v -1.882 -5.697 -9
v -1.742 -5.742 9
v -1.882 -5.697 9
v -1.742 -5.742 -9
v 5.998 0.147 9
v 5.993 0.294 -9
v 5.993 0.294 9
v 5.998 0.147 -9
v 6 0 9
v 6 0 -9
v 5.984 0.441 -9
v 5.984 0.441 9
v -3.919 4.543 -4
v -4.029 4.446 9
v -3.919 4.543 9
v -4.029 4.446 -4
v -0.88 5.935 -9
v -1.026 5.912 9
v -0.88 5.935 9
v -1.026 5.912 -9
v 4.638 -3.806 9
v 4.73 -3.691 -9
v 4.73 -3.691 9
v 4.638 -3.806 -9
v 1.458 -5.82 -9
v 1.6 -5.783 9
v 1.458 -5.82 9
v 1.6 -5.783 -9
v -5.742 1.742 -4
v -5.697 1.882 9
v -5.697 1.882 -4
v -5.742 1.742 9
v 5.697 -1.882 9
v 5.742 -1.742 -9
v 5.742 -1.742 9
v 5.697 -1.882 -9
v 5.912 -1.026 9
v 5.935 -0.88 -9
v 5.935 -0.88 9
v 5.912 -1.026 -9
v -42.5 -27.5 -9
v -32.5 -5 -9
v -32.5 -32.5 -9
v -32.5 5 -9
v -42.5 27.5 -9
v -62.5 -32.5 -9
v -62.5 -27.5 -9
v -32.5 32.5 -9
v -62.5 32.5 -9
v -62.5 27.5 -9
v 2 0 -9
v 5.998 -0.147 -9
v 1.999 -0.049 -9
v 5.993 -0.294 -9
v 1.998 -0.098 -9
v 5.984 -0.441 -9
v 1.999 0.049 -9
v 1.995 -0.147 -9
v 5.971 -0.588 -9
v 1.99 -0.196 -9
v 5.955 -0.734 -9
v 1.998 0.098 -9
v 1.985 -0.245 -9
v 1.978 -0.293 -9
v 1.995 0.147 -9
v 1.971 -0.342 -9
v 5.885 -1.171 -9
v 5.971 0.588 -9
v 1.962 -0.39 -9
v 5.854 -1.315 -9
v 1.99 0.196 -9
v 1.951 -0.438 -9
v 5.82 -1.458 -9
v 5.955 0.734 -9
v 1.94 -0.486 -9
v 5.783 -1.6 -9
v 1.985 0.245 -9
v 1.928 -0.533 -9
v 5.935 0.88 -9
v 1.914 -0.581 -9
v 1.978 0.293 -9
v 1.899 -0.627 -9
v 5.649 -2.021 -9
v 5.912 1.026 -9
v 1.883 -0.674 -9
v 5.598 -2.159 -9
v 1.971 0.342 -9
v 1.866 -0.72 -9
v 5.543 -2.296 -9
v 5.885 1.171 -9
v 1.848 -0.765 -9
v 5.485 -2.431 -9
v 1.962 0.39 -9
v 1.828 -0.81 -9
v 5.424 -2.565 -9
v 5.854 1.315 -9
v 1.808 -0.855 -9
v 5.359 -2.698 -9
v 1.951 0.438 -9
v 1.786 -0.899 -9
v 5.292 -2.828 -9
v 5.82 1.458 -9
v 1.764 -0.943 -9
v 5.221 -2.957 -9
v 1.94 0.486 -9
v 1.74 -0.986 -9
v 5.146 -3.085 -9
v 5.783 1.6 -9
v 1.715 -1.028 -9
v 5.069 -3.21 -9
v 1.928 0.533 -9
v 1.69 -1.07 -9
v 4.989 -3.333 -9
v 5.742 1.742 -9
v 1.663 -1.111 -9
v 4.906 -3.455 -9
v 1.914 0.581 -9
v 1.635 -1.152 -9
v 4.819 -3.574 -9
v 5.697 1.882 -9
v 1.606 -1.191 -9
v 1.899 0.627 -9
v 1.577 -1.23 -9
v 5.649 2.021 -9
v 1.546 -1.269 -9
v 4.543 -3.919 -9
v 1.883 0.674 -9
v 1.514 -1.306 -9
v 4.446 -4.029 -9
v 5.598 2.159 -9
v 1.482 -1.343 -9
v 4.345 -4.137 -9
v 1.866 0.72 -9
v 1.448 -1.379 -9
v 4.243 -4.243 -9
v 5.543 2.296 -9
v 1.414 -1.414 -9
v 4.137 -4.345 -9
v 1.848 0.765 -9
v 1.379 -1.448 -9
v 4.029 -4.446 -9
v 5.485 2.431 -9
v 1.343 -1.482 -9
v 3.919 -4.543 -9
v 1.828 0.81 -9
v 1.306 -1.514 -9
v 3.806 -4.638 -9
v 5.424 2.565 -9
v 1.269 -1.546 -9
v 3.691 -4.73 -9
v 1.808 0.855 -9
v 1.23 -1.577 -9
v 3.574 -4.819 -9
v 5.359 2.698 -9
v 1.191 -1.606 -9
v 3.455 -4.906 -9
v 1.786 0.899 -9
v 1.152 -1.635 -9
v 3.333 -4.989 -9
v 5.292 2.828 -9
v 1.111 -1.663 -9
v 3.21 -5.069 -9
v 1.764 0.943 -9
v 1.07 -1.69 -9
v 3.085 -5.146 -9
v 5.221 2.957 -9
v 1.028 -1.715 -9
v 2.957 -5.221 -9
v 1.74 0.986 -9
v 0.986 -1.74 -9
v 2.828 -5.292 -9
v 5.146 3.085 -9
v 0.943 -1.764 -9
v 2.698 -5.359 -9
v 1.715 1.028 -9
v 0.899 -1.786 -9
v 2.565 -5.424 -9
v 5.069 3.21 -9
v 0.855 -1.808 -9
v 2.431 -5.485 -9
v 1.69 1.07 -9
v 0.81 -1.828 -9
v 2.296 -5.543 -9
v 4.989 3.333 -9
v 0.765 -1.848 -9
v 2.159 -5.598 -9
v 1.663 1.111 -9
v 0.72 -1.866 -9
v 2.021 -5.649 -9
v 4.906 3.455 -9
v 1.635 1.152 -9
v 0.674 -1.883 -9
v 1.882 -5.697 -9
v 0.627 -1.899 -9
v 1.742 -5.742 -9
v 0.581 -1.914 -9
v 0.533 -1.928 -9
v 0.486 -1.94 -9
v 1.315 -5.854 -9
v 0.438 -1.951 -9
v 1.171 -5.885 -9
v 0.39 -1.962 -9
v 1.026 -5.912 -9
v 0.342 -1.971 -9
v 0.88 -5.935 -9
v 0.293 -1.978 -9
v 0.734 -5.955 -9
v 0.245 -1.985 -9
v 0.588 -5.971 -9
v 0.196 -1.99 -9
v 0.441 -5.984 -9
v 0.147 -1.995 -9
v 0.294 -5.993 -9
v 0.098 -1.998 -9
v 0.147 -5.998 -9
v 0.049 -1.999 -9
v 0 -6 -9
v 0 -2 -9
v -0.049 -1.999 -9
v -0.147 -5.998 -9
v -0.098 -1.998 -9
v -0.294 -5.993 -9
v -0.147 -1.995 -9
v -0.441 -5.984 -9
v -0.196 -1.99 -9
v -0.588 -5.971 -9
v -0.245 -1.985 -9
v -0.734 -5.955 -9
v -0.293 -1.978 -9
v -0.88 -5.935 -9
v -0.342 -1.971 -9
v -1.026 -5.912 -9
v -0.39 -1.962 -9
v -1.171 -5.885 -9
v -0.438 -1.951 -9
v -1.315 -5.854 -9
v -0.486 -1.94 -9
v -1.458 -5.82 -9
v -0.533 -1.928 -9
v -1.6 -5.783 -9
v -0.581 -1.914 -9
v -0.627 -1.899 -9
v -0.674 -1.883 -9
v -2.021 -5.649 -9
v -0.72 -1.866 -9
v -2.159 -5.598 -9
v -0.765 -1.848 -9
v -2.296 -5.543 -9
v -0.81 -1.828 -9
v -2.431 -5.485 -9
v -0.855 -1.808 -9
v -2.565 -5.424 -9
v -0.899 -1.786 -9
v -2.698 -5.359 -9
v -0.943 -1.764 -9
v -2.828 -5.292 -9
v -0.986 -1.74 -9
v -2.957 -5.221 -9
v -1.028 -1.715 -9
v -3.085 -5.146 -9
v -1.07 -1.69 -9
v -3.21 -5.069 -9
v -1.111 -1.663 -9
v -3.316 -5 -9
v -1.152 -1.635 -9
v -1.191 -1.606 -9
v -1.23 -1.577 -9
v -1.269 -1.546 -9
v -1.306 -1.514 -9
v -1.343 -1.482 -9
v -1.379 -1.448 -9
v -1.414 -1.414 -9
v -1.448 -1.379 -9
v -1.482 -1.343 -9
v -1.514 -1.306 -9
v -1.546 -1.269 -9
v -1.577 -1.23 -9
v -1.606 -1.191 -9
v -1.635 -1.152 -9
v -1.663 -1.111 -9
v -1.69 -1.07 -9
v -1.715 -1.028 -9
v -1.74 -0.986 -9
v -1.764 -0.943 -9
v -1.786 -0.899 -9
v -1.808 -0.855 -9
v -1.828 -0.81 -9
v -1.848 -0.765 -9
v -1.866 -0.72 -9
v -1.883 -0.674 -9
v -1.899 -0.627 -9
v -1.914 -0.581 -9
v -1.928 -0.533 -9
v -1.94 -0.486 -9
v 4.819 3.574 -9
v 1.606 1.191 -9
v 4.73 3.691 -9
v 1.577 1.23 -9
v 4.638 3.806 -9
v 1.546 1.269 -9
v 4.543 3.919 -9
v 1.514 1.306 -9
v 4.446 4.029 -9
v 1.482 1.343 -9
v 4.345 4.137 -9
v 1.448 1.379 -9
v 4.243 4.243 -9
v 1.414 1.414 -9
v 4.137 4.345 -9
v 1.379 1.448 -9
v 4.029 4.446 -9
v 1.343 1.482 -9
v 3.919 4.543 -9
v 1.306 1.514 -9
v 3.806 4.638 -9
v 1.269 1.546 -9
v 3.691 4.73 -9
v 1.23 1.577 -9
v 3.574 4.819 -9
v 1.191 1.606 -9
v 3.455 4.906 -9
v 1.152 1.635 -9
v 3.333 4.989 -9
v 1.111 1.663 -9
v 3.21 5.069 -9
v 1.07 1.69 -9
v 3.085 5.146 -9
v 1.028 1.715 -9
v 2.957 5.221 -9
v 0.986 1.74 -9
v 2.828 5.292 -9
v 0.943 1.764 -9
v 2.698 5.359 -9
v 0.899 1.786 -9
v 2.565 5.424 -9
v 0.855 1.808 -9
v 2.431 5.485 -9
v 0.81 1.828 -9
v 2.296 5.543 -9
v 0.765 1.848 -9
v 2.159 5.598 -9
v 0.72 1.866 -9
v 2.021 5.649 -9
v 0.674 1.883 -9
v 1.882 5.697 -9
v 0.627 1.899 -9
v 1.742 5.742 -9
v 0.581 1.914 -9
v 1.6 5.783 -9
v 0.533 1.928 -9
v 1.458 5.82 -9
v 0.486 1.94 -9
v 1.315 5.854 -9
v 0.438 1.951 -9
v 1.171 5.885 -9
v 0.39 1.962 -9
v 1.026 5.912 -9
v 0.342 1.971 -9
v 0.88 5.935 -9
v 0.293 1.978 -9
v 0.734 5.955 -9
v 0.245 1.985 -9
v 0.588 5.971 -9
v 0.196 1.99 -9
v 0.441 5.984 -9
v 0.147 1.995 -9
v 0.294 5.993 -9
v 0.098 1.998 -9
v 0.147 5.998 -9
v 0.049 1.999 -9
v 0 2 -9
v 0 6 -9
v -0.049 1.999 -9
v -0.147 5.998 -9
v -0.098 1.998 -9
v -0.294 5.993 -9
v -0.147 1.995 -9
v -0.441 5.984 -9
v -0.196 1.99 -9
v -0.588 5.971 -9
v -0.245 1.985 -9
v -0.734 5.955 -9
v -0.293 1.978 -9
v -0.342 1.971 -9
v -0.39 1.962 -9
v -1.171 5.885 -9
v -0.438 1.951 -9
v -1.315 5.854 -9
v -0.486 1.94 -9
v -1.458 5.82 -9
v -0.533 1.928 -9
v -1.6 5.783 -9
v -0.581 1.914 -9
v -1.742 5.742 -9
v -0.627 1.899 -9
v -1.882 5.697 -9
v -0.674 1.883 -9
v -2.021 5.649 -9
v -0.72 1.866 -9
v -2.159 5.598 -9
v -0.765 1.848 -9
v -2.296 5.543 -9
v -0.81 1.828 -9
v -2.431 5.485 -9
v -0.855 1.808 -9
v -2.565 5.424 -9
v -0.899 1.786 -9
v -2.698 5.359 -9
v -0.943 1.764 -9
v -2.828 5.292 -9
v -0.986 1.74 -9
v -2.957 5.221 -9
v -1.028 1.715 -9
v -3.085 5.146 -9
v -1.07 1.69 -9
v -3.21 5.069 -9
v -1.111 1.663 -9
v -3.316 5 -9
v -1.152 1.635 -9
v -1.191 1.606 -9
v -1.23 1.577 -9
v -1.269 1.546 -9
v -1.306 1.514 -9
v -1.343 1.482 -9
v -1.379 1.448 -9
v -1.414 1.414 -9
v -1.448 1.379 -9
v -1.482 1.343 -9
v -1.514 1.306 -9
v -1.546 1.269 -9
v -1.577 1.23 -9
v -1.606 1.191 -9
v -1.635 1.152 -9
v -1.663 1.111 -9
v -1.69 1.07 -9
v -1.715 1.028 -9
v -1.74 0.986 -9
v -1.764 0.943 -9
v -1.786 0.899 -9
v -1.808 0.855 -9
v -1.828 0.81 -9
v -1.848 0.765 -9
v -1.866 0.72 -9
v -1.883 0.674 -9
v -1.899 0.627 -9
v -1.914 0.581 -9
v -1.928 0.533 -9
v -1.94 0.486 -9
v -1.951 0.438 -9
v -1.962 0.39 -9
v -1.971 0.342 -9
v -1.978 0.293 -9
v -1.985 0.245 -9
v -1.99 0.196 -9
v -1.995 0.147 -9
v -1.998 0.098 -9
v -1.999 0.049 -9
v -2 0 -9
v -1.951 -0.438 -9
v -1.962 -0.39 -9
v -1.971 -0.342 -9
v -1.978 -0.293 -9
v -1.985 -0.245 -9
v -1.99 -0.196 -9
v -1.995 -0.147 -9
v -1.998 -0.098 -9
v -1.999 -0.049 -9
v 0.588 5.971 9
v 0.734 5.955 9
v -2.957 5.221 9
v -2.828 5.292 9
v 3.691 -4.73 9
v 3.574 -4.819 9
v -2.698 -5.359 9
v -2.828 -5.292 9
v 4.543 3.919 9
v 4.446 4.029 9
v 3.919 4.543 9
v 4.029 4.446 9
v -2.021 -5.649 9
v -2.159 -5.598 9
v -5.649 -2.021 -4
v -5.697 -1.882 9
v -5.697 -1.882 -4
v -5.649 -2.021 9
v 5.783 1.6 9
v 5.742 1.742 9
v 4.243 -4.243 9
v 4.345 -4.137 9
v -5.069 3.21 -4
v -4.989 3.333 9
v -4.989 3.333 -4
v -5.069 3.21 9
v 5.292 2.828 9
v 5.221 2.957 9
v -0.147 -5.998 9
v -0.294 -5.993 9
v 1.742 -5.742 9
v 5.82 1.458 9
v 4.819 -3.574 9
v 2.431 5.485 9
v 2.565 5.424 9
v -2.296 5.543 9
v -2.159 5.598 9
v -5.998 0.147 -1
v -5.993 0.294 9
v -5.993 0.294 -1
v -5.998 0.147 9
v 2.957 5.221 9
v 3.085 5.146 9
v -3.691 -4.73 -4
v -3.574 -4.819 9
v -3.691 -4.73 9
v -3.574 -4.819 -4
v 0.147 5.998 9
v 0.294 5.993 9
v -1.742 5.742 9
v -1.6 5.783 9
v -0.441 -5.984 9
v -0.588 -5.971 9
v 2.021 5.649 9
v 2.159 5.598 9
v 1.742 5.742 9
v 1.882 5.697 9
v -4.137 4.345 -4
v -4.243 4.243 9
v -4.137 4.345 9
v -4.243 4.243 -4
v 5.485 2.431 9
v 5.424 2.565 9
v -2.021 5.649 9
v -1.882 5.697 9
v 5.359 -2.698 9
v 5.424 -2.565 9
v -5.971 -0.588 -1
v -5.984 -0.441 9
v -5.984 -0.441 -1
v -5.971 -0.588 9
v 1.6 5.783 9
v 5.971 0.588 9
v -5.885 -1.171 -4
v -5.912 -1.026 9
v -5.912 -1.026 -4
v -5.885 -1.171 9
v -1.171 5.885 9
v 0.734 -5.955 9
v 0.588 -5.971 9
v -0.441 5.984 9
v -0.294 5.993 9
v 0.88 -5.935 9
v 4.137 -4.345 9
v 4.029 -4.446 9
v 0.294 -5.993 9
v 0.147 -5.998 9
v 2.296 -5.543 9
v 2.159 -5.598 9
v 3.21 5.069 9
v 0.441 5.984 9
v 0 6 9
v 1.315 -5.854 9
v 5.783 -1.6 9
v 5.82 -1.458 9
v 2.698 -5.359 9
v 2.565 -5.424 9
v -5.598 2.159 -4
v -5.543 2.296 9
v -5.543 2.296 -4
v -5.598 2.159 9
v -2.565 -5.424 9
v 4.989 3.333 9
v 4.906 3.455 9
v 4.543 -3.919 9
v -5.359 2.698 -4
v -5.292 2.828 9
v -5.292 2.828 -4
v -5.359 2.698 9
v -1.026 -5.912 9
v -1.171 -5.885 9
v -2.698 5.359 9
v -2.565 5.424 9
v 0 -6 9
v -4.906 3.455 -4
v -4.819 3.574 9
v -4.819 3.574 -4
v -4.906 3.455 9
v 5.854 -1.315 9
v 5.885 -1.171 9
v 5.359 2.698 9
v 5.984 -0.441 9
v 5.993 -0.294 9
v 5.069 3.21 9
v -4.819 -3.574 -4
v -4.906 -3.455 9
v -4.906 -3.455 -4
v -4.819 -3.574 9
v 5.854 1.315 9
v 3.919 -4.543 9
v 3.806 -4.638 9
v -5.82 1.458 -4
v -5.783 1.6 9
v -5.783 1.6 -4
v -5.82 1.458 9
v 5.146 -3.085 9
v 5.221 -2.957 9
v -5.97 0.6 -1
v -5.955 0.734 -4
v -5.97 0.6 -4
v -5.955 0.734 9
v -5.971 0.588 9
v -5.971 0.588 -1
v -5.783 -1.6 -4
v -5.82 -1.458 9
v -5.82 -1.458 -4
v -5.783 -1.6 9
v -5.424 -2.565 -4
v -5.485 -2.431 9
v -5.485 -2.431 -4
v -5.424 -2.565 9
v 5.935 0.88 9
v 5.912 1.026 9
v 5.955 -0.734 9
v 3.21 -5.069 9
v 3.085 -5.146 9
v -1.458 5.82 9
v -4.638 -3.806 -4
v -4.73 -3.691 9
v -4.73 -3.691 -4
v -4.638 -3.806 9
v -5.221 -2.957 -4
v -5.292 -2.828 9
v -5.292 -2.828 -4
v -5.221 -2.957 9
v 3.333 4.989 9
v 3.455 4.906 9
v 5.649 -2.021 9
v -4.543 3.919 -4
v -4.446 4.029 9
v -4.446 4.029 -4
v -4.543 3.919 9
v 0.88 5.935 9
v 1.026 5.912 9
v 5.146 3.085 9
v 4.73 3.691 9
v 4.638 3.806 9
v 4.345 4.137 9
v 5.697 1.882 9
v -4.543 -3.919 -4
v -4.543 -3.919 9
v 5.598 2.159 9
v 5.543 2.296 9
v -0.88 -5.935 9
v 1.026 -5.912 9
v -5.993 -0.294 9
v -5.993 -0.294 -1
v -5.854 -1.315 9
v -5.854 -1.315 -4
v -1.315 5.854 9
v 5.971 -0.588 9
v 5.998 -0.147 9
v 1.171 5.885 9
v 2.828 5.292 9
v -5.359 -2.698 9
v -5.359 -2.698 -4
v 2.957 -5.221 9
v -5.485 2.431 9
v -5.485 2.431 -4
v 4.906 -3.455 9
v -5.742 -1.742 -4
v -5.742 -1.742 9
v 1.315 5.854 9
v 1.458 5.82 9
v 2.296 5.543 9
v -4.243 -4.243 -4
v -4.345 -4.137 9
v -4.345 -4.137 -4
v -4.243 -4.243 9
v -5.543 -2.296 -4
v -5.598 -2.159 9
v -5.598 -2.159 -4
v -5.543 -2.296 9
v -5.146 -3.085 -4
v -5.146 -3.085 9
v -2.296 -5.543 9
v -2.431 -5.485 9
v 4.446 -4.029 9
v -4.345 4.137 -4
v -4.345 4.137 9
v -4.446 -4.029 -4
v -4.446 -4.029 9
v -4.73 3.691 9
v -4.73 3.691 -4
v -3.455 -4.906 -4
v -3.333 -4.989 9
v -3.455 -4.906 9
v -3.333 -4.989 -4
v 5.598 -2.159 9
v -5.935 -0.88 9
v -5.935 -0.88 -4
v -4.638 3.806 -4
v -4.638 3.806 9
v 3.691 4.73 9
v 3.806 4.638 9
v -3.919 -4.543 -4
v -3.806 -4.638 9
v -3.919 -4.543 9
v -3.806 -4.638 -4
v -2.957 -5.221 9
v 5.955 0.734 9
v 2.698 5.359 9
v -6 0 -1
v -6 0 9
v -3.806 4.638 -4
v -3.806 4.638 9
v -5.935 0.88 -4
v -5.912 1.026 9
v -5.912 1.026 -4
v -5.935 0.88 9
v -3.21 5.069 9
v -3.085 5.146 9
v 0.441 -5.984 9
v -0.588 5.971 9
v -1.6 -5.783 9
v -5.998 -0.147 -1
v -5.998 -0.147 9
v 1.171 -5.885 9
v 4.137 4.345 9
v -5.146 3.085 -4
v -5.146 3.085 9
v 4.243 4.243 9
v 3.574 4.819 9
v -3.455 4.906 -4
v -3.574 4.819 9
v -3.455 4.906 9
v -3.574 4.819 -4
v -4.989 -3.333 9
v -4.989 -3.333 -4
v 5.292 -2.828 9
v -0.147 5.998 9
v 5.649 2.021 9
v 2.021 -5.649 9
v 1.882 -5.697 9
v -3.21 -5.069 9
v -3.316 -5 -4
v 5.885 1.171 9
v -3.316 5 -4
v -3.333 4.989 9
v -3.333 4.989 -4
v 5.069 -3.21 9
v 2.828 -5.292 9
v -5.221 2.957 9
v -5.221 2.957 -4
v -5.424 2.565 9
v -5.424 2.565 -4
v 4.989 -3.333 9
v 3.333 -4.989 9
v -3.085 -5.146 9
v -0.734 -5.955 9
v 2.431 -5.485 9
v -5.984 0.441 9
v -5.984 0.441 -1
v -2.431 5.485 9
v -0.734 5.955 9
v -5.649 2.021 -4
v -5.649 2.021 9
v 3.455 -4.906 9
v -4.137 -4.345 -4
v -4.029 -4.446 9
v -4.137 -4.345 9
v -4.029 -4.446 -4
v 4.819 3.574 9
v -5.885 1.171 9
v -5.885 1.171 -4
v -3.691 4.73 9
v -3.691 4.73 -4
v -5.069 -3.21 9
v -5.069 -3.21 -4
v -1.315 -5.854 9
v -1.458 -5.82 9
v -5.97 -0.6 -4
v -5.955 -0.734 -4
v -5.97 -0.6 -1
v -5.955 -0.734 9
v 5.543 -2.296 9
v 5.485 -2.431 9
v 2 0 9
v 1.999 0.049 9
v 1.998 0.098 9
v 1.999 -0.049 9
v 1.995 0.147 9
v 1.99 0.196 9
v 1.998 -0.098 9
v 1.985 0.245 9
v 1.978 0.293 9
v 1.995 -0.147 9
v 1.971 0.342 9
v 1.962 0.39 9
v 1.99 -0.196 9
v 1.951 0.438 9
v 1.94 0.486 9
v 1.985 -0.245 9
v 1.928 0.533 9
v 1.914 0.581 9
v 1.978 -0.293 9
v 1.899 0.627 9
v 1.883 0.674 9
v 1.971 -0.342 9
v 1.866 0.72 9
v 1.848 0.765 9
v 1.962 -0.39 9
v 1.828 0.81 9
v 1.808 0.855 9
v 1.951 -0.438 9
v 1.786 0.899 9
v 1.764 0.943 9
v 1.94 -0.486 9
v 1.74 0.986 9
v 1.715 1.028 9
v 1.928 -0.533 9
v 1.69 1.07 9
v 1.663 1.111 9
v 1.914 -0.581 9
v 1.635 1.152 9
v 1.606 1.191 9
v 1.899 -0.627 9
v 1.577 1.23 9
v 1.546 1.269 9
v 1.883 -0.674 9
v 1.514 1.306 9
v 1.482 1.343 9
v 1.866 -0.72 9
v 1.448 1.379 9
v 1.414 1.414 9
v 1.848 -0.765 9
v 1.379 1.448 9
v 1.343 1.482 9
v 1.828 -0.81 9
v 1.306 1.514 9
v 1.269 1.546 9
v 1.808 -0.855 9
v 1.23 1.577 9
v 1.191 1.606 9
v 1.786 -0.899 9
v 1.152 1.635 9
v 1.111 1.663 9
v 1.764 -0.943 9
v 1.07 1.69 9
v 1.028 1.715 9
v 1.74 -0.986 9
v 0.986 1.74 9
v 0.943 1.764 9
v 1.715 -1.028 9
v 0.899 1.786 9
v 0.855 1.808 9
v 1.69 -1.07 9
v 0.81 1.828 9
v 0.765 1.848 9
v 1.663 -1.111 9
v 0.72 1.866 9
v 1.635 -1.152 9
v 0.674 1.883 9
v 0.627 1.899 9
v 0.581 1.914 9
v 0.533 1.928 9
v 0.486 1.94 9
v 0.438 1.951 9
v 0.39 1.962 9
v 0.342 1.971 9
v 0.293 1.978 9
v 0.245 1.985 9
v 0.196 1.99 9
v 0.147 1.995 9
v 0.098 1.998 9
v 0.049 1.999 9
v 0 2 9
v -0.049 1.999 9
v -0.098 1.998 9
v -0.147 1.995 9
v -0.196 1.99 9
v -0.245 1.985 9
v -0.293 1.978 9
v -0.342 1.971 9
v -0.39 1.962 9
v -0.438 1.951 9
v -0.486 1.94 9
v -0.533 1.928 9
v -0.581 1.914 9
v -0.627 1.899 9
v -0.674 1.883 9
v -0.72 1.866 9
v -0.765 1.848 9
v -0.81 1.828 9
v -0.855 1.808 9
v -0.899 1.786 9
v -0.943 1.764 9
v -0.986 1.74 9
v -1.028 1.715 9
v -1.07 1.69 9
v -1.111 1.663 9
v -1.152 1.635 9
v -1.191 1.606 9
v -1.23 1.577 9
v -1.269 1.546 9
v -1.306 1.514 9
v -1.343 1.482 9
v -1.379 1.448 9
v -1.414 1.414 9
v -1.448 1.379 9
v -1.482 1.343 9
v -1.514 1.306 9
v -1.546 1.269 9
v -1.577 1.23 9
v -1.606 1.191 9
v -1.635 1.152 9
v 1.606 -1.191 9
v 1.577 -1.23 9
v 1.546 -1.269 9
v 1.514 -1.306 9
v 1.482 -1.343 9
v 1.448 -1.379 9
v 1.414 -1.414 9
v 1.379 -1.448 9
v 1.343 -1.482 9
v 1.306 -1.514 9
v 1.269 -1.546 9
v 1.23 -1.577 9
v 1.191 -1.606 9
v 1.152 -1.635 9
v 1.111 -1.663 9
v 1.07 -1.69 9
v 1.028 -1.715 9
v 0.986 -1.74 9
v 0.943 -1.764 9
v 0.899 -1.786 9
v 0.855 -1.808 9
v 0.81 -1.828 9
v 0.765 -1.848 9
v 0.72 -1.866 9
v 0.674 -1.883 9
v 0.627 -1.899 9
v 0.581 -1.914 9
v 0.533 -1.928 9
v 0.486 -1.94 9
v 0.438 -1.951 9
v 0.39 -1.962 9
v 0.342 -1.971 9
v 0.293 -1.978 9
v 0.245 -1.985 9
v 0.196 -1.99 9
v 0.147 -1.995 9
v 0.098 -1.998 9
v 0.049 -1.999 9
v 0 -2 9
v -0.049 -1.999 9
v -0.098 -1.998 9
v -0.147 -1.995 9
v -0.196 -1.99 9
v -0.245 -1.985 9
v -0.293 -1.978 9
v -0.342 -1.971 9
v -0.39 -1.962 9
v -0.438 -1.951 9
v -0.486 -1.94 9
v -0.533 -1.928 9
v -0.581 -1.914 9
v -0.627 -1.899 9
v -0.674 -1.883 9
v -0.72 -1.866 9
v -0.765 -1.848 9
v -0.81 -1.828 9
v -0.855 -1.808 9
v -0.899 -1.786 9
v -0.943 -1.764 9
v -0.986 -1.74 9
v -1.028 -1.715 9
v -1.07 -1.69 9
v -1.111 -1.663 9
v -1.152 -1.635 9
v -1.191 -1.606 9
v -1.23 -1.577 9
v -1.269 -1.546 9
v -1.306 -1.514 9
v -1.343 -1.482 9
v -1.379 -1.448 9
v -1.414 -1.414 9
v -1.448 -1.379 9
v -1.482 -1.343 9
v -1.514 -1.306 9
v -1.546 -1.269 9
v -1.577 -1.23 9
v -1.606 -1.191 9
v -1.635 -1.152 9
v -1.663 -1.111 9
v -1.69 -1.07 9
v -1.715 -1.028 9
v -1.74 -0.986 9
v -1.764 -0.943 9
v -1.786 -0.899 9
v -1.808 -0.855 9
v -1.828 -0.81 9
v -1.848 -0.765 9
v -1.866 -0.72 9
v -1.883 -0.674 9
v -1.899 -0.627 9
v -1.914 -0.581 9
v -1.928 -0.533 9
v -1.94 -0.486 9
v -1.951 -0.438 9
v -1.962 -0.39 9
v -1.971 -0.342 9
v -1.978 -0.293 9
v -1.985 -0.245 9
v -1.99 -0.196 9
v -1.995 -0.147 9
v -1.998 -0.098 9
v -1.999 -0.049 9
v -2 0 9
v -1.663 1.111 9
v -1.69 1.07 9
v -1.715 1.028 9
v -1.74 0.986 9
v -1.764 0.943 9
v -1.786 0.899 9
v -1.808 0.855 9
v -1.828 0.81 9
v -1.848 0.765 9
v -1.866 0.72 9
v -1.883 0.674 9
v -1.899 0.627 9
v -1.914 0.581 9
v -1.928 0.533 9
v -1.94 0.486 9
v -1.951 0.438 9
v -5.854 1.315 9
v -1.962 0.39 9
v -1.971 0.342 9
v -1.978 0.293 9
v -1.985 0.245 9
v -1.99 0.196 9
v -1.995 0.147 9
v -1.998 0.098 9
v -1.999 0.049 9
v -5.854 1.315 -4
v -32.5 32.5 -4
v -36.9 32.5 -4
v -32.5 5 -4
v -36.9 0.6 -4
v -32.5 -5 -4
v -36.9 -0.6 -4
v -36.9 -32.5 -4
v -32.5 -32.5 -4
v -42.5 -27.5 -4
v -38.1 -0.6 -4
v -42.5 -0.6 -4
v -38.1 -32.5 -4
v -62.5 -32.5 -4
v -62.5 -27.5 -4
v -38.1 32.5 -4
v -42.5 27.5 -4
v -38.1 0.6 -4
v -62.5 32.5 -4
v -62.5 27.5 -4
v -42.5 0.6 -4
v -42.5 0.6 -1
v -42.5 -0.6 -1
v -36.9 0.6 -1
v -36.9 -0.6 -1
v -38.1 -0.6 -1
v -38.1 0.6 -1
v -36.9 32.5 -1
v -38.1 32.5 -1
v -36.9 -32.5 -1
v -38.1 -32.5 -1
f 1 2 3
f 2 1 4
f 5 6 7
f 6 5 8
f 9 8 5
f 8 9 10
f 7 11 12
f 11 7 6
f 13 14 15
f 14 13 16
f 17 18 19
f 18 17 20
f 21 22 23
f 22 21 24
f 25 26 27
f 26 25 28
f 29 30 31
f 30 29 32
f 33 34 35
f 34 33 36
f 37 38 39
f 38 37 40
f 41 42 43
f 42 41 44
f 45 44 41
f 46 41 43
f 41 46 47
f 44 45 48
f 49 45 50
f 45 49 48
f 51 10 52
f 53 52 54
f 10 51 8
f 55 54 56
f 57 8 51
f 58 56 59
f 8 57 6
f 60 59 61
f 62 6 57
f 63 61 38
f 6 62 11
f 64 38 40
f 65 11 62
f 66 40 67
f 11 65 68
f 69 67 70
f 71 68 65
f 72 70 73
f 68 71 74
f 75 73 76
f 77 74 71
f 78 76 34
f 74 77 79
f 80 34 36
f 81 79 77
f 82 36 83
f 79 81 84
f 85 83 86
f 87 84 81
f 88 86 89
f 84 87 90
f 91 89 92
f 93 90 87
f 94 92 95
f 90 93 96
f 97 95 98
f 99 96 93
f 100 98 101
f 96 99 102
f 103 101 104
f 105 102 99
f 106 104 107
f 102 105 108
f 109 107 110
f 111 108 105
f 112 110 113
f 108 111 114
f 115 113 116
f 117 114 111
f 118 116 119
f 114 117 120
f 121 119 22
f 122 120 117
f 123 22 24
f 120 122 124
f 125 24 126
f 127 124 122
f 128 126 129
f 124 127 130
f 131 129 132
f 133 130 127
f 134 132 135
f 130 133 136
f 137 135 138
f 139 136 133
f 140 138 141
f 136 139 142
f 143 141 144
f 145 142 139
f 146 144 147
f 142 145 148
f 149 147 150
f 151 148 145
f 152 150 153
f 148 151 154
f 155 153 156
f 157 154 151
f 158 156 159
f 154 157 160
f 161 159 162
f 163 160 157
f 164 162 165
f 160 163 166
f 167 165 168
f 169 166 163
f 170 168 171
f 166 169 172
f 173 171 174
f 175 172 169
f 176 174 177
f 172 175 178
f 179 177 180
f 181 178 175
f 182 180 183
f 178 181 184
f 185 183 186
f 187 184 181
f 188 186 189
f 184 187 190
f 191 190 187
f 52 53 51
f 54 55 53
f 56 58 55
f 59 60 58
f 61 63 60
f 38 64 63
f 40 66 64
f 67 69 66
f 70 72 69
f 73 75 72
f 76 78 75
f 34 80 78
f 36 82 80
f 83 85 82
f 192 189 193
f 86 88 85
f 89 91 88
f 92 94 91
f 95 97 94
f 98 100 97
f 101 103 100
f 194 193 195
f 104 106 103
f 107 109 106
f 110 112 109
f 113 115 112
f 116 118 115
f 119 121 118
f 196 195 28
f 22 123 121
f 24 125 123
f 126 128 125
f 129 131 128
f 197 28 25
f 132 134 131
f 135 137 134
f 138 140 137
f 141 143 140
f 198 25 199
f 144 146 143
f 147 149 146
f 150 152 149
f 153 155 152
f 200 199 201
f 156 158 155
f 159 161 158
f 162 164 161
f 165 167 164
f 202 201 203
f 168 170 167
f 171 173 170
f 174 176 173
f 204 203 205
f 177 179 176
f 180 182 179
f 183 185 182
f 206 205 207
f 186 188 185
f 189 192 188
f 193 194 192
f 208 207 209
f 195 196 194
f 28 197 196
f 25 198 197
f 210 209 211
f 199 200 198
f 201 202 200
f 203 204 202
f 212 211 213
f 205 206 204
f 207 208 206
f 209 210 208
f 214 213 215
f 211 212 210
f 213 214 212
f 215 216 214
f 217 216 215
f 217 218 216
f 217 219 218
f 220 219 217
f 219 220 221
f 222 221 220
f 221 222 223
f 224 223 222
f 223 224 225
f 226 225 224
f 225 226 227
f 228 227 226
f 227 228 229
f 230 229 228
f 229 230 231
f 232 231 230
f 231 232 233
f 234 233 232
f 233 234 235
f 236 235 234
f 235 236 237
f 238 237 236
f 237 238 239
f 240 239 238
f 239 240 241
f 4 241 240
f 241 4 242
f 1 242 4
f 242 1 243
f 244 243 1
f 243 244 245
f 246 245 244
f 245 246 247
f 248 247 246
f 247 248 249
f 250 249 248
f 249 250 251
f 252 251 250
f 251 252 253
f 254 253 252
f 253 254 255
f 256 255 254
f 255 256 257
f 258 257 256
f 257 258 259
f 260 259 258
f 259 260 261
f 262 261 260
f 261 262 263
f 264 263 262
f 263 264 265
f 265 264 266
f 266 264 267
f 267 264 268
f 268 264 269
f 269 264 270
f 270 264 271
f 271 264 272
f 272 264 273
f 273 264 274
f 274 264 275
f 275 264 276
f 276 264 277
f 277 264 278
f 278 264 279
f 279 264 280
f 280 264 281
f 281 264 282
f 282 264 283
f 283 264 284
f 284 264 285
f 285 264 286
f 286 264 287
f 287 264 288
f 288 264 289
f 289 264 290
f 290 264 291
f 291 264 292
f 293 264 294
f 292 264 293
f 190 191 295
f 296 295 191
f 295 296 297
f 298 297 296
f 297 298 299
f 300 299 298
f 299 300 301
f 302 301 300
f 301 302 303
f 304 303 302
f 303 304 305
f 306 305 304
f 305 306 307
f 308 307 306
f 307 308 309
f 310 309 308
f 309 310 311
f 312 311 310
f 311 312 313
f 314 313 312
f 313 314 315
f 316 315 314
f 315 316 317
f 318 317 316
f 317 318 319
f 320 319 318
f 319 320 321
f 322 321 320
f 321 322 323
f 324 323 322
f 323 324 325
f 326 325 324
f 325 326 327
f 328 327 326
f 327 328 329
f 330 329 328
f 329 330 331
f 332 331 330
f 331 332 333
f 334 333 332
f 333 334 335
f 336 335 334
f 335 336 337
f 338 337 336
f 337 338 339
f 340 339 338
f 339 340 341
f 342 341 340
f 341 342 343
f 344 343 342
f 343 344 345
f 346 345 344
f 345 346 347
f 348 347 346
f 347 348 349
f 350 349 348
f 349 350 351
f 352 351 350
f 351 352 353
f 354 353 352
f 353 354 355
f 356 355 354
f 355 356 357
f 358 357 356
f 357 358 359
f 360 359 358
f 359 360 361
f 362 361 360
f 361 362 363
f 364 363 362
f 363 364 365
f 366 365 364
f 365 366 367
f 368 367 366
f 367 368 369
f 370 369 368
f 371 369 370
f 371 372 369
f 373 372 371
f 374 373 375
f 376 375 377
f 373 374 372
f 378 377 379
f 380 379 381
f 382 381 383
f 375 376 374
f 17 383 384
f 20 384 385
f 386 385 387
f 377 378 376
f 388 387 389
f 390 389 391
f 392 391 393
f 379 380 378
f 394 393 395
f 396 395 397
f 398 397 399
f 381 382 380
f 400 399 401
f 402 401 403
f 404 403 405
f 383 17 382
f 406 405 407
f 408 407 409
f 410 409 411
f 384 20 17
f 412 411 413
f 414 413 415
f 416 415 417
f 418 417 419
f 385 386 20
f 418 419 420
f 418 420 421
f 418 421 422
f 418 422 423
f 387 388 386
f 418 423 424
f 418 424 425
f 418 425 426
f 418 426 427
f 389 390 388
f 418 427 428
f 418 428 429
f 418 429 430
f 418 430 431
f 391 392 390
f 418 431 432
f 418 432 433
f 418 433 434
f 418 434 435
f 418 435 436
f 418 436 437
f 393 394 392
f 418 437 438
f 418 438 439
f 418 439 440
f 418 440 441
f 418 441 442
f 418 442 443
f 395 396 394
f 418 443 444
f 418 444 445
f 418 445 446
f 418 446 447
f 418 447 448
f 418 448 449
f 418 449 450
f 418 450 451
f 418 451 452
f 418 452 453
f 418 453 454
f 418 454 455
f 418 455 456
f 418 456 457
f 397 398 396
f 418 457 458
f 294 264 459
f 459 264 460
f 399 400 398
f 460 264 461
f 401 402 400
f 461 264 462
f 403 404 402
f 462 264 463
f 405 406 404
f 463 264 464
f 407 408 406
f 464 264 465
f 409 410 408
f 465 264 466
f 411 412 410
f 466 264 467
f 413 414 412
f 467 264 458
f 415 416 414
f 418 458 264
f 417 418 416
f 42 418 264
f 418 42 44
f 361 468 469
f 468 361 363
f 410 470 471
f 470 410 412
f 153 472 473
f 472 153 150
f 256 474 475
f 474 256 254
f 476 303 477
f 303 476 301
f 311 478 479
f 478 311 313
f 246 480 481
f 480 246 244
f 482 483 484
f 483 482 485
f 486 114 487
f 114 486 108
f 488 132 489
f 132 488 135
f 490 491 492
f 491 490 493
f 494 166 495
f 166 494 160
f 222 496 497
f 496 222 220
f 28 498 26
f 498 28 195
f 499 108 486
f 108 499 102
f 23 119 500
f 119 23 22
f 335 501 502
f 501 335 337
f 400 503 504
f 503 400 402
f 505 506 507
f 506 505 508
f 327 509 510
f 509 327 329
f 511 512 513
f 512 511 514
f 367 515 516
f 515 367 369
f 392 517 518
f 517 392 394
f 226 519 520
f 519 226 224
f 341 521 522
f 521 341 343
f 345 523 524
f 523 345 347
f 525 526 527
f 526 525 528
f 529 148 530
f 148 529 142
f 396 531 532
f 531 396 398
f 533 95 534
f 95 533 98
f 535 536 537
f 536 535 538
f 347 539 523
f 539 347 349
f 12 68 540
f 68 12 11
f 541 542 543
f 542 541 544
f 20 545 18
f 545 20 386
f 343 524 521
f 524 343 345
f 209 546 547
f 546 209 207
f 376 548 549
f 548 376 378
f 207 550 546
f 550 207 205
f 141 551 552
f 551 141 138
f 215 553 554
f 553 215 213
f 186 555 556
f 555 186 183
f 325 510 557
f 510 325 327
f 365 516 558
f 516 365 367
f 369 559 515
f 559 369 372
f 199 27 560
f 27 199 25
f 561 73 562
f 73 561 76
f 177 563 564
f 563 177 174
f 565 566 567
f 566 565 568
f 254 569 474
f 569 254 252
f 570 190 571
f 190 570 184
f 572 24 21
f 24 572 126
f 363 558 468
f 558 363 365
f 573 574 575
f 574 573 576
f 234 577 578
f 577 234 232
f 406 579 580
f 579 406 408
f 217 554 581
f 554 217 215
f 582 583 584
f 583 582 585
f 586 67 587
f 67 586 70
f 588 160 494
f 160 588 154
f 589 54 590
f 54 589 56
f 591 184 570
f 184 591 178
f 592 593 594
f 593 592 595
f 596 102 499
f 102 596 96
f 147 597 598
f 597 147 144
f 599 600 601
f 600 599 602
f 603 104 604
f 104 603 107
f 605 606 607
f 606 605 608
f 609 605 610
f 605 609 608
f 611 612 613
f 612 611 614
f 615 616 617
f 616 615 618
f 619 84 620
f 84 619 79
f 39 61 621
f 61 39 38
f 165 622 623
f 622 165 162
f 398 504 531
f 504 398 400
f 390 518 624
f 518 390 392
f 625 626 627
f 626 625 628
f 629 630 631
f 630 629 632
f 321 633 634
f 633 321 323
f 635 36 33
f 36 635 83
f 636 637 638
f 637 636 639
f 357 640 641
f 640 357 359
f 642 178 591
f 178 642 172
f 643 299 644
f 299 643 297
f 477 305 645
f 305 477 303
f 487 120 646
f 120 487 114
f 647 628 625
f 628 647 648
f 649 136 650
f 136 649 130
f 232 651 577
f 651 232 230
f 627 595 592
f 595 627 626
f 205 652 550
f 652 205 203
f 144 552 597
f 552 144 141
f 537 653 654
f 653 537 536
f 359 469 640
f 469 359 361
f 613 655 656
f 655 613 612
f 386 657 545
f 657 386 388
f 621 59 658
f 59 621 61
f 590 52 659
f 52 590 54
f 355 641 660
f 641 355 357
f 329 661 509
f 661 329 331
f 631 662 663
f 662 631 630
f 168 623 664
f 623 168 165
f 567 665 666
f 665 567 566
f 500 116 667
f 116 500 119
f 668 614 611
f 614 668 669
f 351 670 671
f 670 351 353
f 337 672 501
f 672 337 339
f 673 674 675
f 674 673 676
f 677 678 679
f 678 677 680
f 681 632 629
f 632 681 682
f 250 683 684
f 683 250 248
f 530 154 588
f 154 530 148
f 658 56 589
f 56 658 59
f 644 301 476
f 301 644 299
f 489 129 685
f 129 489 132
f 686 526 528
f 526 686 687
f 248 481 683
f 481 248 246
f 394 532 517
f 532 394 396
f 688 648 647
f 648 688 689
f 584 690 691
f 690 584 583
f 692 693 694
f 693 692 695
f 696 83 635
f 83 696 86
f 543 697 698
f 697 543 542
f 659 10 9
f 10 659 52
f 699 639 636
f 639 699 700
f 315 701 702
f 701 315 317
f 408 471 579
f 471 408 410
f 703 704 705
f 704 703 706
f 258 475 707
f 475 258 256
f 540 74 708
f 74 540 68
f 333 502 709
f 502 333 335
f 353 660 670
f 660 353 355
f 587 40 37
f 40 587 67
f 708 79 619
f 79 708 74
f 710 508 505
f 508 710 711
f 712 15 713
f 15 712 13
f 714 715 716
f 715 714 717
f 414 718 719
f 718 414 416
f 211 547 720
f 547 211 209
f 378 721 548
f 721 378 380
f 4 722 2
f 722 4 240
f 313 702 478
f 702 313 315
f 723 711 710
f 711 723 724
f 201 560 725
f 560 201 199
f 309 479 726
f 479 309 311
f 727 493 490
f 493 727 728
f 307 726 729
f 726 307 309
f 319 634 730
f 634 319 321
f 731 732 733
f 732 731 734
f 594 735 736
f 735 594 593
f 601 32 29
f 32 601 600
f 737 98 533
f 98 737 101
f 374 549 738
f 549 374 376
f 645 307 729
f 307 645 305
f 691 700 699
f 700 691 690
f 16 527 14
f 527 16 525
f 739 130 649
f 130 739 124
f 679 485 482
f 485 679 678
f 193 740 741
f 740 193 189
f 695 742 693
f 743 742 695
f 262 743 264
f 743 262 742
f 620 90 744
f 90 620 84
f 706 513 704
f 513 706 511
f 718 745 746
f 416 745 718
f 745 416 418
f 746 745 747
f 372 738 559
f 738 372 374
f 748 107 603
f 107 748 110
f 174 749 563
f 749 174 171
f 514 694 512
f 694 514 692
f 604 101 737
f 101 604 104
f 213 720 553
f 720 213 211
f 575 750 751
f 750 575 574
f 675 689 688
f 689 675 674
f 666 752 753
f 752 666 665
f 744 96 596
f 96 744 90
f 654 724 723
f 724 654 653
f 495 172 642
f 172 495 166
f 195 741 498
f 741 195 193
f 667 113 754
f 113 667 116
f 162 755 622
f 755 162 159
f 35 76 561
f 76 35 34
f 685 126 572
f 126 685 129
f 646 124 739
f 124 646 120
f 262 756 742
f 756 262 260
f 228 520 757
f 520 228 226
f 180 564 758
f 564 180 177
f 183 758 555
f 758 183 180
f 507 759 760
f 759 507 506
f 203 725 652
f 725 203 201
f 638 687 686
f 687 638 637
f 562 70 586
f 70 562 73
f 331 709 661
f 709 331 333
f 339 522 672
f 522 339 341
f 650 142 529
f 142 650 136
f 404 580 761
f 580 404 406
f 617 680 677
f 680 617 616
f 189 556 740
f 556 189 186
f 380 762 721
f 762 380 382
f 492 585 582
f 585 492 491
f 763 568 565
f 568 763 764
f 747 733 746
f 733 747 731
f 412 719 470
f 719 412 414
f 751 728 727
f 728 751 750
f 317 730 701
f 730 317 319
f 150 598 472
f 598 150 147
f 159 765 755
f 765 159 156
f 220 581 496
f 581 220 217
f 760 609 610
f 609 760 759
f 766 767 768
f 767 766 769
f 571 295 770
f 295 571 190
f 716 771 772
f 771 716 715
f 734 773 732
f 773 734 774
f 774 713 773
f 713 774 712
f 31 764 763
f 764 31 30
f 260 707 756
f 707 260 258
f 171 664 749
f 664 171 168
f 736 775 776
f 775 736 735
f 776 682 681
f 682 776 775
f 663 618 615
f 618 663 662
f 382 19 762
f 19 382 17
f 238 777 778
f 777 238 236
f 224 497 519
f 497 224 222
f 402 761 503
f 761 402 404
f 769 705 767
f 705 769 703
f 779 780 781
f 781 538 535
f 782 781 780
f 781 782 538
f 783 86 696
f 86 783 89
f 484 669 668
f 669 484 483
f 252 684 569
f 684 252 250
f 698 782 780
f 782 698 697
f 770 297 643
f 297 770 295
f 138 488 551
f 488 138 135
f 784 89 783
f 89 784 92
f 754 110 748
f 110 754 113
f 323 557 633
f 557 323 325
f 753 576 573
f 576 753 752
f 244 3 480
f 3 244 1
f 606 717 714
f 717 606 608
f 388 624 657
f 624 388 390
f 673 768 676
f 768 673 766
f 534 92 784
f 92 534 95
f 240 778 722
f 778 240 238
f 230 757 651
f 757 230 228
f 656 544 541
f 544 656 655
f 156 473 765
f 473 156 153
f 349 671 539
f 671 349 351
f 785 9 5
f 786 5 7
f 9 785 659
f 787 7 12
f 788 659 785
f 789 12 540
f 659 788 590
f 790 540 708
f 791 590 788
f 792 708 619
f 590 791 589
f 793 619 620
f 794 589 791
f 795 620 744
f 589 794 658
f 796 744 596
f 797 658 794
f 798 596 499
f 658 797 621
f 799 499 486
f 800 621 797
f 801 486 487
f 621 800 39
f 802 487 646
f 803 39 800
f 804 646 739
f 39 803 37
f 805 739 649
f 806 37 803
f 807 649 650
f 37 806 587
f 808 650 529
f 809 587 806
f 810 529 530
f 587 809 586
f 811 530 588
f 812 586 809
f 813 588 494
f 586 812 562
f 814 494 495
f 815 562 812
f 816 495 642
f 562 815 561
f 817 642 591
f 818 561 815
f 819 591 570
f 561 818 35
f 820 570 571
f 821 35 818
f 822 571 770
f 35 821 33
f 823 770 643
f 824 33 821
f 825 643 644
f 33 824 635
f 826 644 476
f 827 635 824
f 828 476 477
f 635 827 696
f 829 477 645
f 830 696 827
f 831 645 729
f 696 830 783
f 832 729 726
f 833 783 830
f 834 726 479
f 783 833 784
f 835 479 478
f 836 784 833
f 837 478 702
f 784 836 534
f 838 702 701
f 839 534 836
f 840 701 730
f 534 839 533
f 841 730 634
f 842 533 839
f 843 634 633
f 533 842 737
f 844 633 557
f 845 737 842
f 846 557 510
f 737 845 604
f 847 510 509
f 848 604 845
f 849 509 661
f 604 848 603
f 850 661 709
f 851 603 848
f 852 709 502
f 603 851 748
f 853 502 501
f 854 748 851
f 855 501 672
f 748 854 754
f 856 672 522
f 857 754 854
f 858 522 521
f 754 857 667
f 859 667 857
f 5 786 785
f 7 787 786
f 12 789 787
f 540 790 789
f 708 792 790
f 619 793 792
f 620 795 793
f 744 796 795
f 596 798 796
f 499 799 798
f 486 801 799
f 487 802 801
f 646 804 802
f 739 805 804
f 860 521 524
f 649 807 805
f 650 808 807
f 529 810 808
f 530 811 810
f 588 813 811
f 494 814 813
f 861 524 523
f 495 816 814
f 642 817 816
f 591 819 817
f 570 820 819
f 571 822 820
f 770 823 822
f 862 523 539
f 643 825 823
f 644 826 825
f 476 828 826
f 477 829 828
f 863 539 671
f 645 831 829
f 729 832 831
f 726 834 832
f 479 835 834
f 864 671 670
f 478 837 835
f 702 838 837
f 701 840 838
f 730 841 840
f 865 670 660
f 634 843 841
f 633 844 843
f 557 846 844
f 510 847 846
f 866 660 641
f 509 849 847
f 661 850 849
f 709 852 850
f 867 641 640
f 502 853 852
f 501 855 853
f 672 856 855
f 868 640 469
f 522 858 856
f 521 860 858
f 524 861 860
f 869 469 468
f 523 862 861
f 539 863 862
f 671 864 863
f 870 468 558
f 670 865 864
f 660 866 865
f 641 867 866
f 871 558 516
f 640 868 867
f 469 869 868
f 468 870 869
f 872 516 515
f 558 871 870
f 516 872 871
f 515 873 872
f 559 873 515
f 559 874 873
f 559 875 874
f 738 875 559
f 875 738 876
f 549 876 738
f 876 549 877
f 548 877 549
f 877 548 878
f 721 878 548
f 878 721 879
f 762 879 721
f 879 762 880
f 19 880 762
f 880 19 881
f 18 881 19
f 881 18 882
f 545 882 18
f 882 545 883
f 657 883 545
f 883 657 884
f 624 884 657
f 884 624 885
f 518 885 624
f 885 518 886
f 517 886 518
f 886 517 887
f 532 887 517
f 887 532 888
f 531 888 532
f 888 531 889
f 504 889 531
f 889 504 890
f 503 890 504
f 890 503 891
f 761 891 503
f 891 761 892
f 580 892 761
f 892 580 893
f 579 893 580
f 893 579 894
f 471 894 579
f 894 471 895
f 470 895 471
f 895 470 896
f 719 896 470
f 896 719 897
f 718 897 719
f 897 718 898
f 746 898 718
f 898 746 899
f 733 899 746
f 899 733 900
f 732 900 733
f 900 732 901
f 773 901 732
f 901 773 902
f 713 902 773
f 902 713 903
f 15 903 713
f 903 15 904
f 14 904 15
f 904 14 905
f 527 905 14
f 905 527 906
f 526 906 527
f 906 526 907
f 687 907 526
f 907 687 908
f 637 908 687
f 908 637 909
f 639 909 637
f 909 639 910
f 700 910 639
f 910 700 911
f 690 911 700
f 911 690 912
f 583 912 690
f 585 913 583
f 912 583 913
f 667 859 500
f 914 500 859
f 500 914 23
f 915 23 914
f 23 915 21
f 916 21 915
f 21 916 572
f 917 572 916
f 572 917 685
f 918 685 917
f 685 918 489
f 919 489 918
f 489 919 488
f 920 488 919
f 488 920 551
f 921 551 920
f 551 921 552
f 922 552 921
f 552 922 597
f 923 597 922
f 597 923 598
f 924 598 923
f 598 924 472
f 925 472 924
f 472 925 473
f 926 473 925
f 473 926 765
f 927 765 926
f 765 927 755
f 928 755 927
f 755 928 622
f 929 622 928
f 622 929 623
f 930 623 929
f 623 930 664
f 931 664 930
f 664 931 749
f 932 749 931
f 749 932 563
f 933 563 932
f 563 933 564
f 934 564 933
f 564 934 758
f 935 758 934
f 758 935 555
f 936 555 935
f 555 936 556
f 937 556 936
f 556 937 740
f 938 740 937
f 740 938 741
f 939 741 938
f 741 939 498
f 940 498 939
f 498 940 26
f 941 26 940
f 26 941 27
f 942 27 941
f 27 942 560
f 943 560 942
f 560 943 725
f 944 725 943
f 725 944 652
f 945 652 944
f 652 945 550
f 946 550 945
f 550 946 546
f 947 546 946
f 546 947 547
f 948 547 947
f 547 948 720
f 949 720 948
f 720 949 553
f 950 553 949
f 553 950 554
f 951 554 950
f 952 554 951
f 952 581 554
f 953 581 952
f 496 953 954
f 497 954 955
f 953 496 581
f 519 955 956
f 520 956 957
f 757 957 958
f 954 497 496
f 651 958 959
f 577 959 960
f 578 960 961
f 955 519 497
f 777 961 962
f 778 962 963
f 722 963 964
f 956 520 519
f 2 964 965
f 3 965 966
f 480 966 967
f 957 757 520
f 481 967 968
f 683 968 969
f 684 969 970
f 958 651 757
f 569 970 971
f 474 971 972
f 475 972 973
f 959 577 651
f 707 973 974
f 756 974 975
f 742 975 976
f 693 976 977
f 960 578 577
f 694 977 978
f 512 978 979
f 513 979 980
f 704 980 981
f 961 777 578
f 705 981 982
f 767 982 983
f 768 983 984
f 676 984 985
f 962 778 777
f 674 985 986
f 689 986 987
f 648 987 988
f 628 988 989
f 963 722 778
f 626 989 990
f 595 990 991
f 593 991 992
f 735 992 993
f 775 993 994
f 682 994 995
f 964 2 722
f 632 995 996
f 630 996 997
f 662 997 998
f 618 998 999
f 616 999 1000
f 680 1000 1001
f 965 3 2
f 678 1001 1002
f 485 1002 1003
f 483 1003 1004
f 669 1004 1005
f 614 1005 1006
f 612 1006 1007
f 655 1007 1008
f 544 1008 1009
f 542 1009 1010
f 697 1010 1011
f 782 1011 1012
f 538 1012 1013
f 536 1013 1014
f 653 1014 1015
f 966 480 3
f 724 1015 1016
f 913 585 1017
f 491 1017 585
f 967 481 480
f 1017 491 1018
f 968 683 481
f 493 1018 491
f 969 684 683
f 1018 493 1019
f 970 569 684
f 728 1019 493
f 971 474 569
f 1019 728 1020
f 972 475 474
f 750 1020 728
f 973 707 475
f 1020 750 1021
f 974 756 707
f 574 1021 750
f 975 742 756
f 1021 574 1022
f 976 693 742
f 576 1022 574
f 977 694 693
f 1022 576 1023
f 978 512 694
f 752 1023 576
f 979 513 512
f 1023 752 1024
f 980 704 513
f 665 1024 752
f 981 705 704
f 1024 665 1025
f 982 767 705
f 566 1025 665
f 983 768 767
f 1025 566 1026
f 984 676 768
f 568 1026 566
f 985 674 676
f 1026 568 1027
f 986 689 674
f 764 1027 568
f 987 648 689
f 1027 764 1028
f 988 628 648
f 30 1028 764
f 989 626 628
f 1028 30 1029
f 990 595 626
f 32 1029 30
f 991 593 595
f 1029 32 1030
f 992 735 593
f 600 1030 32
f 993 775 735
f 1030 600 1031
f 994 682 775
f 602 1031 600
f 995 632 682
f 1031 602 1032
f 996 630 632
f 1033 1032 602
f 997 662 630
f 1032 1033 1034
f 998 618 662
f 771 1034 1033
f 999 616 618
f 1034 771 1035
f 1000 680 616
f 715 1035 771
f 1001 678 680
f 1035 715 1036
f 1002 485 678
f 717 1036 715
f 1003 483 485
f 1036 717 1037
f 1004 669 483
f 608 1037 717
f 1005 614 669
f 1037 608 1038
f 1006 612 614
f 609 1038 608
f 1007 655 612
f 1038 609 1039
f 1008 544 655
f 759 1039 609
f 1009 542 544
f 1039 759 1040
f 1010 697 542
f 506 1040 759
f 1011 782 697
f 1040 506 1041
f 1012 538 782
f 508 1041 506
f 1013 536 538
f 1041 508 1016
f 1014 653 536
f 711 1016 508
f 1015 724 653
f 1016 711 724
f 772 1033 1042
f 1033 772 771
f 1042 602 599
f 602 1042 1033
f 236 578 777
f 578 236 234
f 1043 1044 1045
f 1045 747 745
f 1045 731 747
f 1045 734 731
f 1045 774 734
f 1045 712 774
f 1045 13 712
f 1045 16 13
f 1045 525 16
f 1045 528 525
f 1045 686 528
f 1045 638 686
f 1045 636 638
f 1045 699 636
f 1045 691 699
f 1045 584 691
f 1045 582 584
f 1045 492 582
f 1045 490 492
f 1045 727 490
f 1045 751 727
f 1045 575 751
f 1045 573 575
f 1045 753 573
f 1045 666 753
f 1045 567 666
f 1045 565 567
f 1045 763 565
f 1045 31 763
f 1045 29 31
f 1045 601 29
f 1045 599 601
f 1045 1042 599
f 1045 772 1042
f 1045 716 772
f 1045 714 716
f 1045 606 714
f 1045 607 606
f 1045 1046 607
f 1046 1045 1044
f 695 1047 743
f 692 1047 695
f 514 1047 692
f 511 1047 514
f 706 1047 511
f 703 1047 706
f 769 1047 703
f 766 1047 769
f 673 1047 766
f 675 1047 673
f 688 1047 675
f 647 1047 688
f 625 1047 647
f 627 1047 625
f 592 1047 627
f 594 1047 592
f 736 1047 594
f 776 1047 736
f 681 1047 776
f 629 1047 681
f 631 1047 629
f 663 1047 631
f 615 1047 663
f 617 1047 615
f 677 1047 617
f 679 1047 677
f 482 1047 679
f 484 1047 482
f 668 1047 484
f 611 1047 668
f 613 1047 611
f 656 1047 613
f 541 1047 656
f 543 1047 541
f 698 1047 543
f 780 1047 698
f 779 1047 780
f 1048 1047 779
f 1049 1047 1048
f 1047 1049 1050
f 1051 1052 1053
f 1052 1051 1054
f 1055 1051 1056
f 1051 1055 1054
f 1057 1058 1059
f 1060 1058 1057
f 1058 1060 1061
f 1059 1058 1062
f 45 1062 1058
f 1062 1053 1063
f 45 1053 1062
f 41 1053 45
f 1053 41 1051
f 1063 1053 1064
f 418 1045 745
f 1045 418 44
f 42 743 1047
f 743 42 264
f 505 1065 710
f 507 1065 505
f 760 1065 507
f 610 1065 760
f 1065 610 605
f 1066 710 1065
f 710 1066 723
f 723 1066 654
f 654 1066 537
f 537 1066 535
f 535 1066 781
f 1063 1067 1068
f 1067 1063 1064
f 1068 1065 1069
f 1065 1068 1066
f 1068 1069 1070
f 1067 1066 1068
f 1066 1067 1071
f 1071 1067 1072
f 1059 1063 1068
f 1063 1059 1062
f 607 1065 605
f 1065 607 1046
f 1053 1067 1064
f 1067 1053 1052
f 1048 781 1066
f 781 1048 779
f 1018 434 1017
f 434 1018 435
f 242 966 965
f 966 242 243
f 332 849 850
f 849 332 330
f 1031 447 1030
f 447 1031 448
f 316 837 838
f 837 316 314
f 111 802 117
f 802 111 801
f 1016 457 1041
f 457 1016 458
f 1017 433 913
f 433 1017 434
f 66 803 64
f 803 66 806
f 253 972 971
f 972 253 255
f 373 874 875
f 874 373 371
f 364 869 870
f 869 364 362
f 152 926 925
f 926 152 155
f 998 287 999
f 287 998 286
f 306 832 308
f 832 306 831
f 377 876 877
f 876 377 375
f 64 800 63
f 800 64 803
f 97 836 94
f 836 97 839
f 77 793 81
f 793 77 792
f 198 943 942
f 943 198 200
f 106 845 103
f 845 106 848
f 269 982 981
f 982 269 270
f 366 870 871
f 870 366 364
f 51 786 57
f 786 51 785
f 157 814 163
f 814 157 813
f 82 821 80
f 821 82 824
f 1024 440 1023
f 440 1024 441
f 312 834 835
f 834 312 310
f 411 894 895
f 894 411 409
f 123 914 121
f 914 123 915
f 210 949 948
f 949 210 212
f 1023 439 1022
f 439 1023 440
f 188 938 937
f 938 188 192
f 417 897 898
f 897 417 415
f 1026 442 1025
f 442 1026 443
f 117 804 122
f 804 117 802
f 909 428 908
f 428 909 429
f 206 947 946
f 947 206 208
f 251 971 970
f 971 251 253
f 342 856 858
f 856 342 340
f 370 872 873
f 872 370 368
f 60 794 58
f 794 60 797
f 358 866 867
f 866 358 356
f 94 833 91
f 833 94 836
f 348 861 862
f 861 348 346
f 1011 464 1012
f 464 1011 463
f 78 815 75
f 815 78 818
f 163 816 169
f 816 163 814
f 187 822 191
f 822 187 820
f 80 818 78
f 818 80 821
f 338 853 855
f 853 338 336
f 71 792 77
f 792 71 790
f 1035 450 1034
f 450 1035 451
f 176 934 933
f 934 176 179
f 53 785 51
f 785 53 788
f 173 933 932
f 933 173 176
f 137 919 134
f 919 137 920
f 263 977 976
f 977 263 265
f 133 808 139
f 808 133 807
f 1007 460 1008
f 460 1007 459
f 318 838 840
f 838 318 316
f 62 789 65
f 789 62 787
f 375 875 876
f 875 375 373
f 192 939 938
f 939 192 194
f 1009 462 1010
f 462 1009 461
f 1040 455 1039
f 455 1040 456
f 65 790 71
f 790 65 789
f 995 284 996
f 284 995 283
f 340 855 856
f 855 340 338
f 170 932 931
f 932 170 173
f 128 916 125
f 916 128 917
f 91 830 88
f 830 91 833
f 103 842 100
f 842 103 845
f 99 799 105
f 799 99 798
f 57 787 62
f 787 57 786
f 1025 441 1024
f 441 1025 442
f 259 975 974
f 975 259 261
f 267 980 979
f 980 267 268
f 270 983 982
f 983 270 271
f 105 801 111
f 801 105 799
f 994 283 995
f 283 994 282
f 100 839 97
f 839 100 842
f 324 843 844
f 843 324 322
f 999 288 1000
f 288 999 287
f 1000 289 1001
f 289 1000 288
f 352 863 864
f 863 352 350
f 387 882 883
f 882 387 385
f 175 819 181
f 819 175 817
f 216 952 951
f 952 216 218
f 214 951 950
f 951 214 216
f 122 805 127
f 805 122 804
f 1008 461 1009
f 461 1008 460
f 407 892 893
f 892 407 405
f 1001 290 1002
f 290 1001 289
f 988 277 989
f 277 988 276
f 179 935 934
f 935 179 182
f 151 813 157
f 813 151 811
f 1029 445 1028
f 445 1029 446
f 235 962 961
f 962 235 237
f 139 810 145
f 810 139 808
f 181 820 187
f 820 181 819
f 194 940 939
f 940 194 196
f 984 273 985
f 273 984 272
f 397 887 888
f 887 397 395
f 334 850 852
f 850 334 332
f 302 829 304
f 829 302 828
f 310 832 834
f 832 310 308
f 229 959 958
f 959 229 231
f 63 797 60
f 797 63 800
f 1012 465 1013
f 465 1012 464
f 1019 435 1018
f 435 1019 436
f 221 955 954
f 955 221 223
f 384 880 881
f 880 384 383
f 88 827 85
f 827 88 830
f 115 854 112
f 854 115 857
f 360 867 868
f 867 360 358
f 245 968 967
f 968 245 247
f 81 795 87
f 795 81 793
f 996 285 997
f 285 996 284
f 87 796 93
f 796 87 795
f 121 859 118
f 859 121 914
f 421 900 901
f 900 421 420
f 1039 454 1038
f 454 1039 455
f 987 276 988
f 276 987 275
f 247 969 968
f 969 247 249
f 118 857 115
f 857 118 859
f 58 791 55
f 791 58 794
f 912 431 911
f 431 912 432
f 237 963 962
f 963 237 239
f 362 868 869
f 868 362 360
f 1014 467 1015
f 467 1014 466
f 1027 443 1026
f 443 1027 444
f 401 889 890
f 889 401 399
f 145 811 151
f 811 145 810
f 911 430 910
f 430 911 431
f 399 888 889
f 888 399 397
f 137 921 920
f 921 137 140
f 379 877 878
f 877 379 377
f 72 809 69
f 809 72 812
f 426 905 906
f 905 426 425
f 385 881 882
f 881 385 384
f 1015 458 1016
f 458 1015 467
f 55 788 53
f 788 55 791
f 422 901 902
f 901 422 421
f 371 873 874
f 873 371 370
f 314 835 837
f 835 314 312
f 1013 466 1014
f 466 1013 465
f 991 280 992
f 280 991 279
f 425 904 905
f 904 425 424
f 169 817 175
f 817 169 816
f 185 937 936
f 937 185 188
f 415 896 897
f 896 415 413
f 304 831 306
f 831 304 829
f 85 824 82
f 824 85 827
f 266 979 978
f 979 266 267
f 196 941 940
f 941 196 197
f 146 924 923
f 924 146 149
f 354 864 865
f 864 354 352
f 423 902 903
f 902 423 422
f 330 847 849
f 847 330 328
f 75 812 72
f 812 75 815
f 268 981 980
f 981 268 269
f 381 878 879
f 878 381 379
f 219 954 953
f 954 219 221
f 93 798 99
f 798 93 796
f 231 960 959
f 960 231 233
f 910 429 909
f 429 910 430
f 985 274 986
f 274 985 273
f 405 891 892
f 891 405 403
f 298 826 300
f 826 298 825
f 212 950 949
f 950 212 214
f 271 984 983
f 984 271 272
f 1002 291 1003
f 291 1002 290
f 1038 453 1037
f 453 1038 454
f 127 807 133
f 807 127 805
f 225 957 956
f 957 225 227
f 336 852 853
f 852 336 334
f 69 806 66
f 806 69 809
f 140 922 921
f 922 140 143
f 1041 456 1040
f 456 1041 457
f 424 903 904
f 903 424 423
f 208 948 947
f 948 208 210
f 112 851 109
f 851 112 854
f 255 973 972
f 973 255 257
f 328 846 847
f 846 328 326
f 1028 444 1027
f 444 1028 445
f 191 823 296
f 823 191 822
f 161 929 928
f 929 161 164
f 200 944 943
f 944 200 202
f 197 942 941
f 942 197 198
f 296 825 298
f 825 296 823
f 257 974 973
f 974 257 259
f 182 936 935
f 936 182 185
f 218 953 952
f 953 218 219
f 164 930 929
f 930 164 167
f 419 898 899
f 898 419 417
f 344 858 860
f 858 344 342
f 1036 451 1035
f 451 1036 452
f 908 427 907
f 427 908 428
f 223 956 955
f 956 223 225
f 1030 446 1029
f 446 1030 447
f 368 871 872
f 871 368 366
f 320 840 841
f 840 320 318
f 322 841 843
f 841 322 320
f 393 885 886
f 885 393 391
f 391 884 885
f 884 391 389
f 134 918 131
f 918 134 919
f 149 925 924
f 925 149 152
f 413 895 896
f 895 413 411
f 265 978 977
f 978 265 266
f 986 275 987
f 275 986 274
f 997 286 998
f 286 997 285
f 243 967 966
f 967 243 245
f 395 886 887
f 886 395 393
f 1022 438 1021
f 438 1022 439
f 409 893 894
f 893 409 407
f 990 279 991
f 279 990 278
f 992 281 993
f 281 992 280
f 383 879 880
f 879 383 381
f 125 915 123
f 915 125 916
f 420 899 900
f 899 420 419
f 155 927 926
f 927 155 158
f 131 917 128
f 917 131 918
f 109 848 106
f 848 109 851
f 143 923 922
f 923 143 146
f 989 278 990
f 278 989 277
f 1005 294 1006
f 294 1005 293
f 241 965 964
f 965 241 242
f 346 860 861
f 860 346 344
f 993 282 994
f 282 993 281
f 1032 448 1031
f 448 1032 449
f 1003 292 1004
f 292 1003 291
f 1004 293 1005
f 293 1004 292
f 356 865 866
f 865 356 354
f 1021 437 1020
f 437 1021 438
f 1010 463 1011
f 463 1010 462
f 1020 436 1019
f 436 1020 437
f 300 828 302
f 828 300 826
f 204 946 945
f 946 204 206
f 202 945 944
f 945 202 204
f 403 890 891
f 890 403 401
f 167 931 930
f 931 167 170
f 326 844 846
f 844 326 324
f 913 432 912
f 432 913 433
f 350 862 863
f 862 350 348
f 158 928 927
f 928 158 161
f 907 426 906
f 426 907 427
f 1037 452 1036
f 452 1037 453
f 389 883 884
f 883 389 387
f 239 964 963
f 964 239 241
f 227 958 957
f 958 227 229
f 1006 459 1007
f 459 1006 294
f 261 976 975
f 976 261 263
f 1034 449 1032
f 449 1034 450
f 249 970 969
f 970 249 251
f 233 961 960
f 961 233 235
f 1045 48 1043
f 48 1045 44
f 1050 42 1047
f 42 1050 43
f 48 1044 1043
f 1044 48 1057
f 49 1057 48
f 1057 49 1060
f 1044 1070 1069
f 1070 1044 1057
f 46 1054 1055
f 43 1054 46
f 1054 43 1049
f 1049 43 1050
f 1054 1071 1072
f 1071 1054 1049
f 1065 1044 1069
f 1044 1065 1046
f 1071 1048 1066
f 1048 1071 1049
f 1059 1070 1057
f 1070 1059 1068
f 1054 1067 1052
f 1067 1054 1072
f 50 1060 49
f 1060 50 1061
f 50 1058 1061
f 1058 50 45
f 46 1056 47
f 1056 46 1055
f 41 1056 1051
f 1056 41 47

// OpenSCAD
// a custom jig for my Rigid router to cut a circle of the specified diameter
// this jig connects into the attachment rod holes that are built into my router's base

// specified parameter - how big of a circle do I want to cut: 8" ~= 203 mm
cut_circle_diameter = 205;

// specified parameter - what size bit am I using: 3/8" ~= 9.5 mm
bit_diameter = 10;

// measurements of my router
rod_depth = 20;
rod_width = 5;
rod_spread = 60;
bit_to_rod_bar_spacing = 65;

// design measurements for the jig
pin_diameter = 4;
disc_height = 18;
shaft_width = 10;
stiffener_height = 3;
stiffener_width = 0.4*3;

// calculated parameters
disc_diameter = pin_diameter*3;
shaft_length = cut_circle_diameter/2 + bit_diameter/2 - bit_to_rod_bar_spacing;
rod_spread_bar_length = rod_spread + rod_width;
shaft_height = shaft_width/2;

// put it all together
union() {
    difference() {
        union() {
            // create the pivot disc
            cylinder(h=disc_height, d=disc_diameter, center=true, $fn=256);
            // attach the extension shaft
            translate([-shaft_length, -shaft_width/2, -disc_height/2])
                cube(size=[shaft_length, shaft_width, shaft_height]);
            // add a stiffening spine to the extension shaft
            translate([-shaft_length, -stiffener_width/2, -disc_height/2+shaft_height])
                cube(size=[shaft_length, stiffener_width, stiffener_height]);
        }
        // punch the pin hole through the pivot disc
        cylinder(h=disc_height*2, d=pin_diameter, center=true, $fn=256);
    }
    // attach the rod spread bar to the shaft
    translate([-shaft_length, -rod_spread_bar_length/2, -disc_height/2]) {
        cube(size=[shaft_width, rod_spread_bar_length, shaft_height]);
    }
    // add a stiffening spine to the rod spread bar
    translate([-shaft_length+shaft_width/2-stiffener_width/2, -rod_spread_bar_length/2, -disc_height/2+shaft_height]) {
        cube(size=[stiffener_width, rod_spread_bar_length, stiffener_height]);
    }
    // attach first rod
    translate([-shaft_length-rod_depth, rod_spread_bar_length/2-rod_width, -disc_height/2])
        cube(size=[rod_depth, rod_width, rod_width]);
    // attach second rod
    translate([-shaft_length-rod_depth, -rod_spread_bar_length/2, -disc_height/2])
        cube(size=[rod_depth, rod_width, rod_width]);
}
